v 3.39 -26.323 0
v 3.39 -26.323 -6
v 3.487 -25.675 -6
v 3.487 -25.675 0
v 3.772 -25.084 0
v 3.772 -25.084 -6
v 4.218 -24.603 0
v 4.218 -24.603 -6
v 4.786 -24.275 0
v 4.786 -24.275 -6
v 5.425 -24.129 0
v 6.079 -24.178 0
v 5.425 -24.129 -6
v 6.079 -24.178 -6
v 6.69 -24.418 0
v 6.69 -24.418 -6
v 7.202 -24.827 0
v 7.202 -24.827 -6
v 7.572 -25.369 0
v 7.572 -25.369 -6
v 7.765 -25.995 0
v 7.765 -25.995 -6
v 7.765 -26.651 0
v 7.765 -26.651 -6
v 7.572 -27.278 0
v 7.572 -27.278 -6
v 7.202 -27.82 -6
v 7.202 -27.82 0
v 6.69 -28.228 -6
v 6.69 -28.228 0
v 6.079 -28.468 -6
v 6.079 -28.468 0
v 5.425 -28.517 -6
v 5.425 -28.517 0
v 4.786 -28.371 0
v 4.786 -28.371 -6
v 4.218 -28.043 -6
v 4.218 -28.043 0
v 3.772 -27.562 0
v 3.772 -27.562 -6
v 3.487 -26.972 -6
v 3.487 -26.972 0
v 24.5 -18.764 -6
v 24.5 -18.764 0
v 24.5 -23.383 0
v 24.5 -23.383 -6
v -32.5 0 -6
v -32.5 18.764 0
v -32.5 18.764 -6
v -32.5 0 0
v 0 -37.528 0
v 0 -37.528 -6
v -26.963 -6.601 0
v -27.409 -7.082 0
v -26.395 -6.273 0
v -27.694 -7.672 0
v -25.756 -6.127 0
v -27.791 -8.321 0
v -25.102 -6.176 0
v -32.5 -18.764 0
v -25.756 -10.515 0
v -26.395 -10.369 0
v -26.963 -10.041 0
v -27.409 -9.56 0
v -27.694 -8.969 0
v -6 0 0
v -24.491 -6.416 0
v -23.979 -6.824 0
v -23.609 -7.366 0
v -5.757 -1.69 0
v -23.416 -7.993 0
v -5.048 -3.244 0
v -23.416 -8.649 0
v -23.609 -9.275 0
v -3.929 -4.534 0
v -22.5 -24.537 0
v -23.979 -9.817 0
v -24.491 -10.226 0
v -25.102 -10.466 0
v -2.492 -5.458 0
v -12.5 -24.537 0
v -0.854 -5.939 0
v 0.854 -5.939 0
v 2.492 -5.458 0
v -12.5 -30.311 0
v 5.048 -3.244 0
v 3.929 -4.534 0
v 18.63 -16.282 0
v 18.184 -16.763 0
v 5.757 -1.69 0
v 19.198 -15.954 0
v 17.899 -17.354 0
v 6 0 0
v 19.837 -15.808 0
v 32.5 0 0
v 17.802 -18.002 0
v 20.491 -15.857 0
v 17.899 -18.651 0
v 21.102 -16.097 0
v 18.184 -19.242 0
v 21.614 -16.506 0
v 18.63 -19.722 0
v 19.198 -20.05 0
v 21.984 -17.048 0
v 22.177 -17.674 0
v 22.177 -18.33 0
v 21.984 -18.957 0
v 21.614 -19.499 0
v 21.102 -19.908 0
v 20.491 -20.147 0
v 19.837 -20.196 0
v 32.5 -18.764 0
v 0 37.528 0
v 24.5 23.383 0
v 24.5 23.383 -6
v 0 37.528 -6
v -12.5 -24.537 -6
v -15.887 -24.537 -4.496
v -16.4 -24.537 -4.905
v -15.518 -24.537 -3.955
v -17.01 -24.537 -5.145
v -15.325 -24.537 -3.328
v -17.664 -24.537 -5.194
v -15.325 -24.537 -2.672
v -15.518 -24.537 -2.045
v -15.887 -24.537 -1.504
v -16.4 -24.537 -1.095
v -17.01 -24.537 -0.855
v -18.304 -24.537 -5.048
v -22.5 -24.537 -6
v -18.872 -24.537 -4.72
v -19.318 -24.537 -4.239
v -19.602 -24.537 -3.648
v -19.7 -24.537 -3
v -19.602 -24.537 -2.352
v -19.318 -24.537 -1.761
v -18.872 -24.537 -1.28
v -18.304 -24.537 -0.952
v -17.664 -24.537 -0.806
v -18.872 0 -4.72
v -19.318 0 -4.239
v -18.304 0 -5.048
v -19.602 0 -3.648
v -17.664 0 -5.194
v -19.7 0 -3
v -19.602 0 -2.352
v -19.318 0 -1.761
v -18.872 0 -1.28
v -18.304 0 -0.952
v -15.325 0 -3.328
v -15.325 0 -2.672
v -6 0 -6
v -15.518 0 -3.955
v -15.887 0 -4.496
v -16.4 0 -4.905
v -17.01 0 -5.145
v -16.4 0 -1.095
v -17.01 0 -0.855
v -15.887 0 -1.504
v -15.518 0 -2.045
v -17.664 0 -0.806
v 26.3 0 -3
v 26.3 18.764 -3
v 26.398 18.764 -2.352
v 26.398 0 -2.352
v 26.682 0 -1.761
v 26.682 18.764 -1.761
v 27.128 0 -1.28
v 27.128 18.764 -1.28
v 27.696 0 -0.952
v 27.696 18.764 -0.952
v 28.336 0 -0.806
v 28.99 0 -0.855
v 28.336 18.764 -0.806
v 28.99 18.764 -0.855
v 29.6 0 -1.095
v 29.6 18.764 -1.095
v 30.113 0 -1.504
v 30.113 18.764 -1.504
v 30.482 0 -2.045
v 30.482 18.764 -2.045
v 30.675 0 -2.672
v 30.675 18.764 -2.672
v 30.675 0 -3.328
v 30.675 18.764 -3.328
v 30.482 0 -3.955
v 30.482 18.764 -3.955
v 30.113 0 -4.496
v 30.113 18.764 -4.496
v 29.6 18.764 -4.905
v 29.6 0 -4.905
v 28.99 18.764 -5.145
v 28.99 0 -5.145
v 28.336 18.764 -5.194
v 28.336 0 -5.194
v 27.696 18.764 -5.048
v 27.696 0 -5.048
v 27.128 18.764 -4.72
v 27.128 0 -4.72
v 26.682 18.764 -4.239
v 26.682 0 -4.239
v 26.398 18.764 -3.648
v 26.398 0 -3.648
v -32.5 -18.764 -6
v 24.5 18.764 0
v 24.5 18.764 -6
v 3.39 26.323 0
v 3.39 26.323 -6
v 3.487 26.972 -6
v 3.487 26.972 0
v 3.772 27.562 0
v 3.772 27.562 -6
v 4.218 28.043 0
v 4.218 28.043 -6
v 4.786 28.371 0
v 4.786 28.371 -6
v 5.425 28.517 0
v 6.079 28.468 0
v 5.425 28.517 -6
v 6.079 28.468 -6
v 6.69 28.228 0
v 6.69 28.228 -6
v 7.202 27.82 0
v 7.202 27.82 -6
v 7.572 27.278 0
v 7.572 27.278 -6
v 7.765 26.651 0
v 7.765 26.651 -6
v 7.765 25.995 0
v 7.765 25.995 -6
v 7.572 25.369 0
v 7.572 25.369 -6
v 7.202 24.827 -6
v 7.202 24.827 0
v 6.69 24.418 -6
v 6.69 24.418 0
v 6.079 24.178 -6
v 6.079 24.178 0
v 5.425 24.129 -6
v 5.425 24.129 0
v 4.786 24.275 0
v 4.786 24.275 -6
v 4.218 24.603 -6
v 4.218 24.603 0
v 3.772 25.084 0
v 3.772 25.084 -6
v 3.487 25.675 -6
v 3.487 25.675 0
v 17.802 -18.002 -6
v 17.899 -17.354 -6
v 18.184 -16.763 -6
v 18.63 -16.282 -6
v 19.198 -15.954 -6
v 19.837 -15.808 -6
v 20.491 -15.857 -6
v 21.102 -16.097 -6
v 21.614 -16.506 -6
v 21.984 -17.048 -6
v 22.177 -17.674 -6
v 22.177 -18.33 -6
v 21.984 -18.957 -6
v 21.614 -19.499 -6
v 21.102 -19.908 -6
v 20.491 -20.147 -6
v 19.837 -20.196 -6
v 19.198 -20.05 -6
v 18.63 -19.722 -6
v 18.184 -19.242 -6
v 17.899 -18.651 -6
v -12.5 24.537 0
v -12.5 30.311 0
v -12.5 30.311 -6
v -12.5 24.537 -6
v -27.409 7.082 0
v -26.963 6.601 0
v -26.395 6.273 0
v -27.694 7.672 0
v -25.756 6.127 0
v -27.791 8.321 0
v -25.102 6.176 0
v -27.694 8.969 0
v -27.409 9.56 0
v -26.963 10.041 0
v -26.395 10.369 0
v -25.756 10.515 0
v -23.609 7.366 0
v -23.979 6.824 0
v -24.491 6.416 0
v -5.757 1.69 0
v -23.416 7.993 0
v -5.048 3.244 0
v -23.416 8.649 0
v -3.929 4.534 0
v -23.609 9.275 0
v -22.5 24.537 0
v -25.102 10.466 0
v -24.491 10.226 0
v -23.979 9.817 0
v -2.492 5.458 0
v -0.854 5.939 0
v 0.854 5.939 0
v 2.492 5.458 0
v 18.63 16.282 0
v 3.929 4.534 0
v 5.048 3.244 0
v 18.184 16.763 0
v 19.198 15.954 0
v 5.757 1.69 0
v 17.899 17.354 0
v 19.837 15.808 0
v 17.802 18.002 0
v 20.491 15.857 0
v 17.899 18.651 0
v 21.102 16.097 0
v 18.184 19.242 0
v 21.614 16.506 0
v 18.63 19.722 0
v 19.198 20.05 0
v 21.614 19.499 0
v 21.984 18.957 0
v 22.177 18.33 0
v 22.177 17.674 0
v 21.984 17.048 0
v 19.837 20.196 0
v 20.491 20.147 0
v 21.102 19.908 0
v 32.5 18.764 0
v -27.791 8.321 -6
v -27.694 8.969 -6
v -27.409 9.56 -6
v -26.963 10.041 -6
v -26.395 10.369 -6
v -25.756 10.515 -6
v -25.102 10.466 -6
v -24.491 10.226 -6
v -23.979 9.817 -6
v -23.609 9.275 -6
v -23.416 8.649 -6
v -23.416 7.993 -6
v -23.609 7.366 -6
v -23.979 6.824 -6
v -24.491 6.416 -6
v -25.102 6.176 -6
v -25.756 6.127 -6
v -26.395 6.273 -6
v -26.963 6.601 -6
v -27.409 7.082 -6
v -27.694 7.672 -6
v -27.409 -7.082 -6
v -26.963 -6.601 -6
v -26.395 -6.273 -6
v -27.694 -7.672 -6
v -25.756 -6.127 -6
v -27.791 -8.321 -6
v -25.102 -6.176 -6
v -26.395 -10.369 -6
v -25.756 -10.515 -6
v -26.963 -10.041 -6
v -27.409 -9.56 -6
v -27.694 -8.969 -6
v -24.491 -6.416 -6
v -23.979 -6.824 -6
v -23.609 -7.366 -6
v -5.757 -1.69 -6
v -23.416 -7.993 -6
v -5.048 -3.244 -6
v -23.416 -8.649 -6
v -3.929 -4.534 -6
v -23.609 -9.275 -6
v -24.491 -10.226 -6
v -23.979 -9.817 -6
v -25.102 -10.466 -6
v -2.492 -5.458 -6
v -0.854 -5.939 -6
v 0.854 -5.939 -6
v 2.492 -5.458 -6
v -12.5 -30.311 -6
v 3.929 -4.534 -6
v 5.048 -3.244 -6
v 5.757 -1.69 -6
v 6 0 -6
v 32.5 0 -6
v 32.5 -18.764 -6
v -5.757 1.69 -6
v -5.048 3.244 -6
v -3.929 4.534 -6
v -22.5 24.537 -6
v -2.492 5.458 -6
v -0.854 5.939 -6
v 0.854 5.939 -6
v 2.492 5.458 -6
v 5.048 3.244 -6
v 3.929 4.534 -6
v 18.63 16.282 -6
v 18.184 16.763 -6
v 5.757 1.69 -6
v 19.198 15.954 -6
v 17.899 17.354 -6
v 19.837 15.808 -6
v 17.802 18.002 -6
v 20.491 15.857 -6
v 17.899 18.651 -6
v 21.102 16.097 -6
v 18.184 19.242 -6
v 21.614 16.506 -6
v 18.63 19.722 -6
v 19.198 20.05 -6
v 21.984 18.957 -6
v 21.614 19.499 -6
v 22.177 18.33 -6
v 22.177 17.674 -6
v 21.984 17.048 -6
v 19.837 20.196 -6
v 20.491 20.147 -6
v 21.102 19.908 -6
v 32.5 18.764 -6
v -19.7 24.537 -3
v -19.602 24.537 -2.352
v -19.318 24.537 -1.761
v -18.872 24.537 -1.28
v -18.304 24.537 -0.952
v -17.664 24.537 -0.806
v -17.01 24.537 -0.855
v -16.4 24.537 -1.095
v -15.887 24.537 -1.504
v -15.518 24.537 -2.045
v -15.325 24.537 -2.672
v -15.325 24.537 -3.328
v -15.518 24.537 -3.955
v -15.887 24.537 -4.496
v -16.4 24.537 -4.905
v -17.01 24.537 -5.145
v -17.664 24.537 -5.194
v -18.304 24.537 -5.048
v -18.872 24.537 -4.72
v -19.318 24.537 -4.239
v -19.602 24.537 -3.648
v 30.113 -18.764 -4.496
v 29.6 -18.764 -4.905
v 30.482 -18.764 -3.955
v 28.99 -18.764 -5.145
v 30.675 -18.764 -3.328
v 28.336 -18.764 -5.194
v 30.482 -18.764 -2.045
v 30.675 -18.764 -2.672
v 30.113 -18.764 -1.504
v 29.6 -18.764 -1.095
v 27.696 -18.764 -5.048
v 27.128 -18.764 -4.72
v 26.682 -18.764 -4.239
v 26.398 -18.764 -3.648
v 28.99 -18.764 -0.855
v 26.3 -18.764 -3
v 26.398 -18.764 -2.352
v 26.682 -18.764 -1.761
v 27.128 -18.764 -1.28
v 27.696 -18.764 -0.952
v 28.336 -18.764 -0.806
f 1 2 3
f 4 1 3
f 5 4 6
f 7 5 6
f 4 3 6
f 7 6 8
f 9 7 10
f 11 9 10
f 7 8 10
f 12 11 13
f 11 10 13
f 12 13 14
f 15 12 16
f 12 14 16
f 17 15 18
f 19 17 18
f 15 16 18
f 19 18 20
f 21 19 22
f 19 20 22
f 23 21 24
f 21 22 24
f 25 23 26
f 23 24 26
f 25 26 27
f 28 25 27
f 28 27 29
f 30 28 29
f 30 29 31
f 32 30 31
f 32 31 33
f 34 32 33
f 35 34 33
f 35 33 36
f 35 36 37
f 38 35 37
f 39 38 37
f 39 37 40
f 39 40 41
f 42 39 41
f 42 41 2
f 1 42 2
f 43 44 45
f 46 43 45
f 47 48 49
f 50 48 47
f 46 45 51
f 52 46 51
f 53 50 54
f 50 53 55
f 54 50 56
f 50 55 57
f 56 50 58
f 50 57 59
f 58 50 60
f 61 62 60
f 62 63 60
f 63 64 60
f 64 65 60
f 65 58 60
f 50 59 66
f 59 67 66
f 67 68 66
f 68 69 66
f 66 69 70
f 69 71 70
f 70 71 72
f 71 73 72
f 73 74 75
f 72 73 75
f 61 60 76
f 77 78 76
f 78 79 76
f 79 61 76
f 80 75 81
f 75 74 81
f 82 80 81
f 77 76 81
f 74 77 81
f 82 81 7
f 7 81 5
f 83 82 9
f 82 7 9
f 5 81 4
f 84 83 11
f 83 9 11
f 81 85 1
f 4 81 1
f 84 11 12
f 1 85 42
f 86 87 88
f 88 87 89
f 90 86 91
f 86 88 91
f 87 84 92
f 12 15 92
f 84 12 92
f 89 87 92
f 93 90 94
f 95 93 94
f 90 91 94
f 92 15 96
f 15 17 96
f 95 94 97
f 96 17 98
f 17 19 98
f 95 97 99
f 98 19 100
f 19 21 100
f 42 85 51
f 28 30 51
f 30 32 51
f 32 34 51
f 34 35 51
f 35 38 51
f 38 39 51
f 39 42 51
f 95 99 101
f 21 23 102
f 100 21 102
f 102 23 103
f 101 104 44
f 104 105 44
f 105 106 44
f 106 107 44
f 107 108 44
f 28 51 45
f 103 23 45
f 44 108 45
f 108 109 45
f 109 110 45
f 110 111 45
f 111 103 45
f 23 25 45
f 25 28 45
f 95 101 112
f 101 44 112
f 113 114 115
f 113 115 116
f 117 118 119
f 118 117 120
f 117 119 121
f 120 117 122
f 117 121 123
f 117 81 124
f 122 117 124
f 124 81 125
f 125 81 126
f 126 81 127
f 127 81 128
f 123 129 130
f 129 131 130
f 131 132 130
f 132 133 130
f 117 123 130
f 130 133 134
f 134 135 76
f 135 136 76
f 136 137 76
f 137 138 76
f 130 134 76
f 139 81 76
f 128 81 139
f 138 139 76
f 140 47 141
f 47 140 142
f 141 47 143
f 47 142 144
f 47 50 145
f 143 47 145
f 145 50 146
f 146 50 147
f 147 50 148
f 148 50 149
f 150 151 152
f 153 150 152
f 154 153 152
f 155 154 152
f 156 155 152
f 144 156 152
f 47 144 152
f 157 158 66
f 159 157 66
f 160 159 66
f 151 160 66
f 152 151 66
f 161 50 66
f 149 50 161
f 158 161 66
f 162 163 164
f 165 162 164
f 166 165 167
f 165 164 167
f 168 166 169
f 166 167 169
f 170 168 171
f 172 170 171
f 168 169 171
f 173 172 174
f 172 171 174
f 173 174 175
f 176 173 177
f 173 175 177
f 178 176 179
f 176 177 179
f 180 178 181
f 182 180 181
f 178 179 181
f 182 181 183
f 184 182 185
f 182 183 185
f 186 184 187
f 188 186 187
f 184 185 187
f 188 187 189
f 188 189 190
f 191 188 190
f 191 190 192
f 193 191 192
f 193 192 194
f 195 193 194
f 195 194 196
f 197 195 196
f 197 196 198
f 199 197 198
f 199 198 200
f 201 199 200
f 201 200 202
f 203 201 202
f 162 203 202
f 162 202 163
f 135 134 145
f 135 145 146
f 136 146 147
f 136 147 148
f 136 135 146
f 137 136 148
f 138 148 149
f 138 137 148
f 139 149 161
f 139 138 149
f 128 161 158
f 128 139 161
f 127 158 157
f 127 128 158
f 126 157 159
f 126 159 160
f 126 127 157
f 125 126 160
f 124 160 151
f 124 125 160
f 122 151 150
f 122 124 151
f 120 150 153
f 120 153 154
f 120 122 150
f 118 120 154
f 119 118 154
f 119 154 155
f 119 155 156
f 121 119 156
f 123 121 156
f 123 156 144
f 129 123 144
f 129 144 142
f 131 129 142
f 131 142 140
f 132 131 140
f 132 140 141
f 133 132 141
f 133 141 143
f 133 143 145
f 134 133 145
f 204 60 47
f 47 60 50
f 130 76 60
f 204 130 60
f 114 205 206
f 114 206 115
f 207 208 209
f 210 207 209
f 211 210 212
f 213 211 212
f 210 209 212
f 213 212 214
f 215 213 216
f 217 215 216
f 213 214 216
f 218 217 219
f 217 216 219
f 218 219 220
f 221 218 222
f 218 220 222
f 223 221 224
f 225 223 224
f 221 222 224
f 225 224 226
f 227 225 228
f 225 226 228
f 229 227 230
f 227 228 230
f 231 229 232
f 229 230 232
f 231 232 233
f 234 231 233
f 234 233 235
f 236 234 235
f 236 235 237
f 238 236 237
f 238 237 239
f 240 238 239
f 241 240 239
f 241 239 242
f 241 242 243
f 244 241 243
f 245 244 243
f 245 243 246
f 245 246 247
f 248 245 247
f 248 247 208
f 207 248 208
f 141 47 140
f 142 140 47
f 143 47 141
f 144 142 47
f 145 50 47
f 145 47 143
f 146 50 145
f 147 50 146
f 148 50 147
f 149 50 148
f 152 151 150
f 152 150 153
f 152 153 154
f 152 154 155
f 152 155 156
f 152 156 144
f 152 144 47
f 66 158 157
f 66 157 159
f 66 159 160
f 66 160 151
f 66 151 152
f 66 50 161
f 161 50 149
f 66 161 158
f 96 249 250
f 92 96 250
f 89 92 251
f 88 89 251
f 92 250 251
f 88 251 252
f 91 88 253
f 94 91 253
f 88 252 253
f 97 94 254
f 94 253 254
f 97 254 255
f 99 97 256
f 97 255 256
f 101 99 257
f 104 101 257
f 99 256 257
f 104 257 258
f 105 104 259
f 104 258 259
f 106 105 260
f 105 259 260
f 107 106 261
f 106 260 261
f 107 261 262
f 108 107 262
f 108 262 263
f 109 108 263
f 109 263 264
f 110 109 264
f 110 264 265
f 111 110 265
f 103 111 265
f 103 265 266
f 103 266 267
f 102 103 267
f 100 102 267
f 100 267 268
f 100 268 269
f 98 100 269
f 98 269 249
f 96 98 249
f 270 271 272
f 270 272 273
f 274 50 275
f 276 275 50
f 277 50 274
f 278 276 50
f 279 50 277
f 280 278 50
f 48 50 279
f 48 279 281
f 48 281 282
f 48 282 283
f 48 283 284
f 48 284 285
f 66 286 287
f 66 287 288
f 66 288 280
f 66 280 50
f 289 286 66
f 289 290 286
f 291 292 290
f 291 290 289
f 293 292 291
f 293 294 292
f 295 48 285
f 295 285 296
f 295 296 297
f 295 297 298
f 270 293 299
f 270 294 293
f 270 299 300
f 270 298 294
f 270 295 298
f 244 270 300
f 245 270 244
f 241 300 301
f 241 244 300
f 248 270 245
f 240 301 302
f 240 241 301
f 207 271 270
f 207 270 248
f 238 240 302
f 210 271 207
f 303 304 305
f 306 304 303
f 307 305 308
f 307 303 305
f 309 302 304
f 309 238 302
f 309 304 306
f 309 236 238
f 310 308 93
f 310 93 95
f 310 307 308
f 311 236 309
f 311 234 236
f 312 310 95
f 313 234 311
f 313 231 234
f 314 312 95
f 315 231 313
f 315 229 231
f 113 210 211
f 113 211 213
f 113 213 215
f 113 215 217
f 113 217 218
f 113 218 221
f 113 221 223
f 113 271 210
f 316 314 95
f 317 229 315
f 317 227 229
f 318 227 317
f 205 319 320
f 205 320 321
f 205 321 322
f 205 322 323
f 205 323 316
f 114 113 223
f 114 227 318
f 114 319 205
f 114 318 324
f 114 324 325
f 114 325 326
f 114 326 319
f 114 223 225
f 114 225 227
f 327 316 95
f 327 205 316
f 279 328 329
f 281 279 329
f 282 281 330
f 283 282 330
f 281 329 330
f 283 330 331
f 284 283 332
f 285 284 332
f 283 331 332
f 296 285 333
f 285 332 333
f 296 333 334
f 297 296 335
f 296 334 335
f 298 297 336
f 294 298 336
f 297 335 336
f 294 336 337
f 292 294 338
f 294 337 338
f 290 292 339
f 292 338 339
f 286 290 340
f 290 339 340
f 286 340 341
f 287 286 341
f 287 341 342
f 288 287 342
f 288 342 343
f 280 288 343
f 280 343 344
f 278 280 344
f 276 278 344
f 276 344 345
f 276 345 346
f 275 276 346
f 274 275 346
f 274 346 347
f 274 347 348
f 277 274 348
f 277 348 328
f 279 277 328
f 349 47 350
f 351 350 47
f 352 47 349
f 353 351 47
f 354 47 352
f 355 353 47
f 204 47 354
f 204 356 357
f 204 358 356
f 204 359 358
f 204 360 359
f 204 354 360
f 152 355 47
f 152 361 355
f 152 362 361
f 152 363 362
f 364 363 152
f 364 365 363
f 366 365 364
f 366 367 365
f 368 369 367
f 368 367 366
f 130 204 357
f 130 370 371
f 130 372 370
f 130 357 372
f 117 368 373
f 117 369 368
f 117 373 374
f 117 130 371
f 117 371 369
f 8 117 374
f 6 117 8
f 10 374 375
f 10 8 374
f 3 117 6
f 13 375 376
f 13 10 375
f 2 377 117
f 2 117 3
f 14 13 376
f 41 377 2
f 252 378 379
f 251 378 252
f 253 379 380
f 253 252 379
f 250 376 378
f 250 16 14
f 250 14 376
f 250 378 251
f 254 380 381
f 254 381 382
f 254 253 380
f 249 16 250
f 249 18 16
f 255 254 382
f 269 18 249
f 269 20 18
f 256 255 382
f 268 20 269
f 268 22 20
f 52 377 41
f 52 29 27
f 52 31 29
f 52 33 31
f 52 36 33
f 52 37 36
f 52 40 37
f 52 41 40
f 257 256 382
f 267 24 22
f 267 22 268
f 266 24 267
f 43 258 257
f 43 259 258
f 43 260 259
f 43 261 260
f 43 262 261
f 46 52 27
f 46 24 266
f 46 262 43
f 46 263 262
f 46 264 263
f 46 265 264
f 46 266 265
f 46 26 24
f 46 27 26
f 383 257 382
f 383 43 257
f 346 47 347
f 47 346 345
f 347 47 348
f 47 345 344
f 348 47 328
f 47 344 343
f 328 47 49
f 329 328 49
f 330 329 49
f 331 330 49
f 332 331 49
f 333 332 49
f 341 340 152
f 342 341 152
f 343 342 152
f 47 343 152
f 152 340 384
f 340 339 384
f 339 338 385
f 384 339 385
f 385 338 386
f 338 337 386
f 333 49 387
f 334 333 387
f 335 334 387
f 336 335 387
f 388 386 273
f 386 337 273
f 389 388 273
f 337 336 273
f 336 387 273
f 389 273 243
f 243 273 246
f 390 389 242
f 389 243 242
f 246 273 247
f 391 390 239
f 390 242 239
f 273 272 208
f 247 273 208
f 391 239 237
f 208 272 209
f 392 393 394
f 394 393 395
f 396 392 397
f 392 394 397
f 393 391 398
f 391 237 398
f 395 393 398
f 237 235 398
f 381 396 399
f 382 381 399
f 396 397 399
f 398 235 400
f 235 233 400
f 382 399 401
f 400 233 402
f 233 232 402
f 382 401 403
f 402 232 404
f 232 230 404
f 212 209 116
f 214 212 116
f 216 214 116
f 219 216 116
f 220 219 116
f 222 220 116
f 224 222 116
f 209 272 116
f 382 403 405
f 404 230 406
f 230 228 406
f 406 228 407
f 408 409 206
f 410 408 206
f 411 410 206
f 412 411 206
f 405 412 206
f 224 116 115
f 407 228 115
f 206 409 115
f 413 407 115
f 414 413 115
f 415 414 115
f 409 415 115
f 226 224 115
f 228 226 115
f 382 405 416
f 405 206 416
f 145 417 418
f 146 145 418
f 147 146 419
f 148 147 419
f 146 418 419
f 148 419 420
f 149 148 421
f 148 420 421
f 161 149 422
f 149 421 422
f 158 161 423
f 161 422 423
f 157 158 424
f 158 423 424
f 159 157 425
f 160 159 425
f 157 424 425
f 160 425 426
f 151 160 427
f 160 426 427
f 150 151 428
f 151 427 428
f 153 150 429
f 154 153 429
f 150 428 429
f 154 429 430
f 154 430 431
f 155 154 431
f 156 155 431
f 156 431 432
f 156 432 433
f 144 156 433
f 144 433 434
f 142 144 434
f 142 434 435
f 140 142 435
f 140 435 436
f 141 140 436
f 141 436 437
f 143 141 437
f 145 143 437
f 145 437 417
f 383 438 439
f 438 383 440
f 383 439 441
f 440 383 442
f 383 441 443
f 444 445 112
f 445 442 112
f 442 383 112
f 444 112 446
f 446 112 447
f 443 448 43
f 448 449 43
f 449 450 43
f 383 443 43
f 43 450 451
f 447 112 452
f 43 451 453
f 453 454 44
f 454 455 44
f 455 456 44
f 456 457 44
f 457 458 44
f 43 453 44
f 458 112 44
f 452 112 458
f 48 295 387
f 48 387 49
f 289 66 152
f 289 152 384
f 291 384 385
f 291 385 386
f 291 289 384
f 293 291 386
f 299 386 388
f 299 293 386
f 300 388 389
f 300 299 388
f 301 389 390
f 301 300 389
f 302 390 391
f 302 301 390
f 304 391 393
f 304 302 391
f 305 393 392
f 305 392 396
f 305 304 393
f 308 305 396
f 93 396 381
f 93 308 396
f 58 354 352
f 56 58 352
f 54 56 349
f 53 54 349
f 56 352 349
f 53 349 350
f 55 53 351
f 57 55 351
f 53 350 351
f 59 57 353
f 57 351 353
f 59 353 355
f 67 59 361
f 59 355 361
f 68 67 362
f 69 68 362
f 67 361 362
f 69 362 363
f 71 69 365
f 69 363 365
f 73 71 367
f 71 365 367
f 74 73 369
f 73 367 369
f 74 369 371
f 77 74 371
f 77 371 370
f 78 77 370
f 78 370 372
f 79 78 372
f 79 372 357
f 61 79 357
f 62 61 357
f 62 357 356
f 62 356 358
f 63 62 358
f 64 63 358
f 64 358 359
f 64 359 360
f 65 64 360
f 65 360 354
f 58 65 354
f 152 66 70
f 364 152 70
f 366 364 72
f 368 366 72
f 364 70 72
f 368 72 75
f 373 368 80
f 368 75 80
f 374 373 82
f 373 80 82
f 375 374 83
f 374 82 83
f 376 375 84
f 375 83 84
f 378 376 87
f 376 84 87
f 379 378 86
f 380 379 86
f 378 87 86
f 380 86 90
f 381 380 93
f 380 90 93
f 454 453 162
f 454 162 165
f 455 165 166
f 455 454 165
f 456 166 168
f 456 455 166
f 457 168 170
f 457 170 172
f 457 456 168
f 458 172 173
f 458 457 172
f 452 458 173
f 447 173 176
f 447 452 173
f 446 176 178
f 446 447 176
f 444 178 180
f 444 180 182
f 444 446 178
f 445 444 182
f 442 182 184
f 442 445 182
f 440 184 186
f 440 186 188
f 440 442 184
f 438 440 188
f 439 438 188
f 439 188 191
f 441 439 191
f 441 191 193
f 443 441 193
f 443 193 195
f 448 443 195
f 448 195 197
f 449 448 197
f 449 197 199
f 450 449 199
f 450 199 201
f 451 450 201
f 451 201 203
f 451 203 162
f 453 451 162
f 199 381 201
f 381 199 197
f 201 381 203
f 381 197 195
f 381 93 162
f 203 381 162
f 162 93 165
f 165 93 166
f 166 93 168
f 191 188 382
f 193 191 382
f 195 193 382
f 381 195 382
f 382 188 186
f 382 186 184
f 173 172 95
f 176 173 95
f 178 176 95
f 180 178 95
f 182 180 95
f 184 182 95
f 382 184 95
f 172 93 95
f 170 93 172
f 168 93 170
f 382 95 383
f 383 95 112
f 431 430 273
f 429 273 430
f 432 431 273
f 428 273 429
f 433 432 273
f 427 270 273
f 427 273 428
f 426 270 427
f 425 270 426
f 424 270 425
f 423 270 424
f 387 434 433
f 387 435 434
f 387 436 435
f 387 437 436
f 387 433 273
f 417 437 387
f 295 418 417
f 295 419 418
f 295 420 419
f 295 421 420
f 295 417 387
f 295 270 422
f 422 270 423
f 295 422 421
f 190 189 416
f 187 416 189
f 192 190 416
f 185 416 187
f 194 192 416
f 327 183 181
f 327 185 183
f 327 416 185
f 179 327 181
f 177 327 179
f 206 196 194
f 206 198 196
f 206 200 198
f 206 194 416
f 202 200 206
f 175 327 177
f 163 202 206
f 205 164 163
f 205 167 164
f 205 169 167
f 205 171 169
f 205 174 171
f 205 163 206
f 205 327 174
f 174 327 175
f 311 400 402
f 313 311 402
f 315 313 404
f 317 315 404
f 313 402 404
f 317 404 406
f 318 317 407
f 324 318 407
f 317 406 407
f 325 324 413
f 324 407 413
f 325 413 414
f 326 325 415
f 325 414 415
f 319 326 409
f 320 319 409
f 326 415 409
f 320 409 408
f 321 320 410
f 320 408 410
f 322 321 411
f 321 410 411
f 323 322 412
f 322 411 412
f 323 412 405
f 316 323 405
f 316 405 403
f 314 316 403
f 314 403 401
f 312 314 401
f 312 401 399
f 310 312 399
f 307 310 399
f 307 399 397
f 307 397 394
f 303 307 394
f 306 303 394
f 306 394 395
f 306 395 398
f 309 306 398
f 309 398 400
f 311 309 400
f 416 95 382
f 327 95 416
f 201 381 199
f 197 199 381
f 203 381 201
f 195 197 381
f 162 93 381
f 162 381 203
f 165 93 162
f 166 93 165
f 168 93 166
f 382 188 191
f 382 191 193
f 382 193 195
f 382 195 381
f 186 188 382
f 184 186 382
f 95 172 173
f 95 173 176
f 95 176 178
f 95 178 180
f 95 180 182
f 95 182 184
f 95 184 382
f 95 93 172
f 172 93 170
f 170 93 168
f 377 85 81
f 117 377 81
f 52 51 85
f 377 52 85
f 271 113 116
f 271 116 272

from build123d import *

# Parameters (mm, degrees)
F1_DEPTH = 6
F3_D     = 4.4
F5_D     = 4.4
F5_2_D   = 4.4


with BuildPart() as f1:
    # F0 (on Top) → F1 (new body)
    with BuildSketch(Plane.XY):
        with BuildLine():
            ThreePointArc((-6, 0), (0, 6), (6, 0))
            Line((6, 0), (32.5, 0))
            Line((32.5, 0), (32.5, 18.7638837487))
            Line((32.5, 18.7638837487), (24.5, 18.7638837487))
            Line((24.5, 18.7638837487), (24.5, 23.3826859022))
            Line((24.5, 23.3826859022), (0, 37.5277674973))
            Line((0, 37.5277674973), (-12.5, 30.3108891325))
            Line((-12.5, 30.3108891325), (-12.5, 24.5373864406))
            Line((-12.5, 24.5373864406), (-22.5, 24.5373864406))
            Line((-22.5, 24.5373864406), (-32.5, 18.7638837487))
            Line((-32.5, 18.7638837487), (-32.5, 0))
            Line((-32.5, 0), (-6, 0))
        make_face()
    extrude(amount=-F1_DEPTH)

    # F3 (through all)
    with Locations(Plane.XZ):
        with Locations((28.5, -3), (-17.5, -3)):
            Hole(F3_D / 2)


with BuildPart() as f4_1:
    # F4: instance of F1
    add(f1.part.mirror(Plane.XZ))

    # F5#2 (through all)
    with Locations(Plane.XY):
        with Locations((-25.5912923917, -8.32085), (-25.5912923917, 8.32085), (5.5895787148, 26.3231343269), (20.001713677, 18.0022843269), (20.001713677, -18.0022843269), (5.5895787148, -26.3231343269)):
            Hole(F5_2_D / 2)


with BuildPart() as f1_1:
    add(f1.part)

    # F5 (through all)
    with Locations(Plane.XY):
        with Locations((-25.5912923917, -8.32085), (-25.5912923917, 8.32085), (5.5895787148, 26.3231343269), (20.001713677, 18.0022843269), (20.001713677, -18.0022843269), (5.5895787148, -26.3231343269)):
            Hole(F5_D / 2)


solid = Compound([f4_1.part, f1_1.part])
